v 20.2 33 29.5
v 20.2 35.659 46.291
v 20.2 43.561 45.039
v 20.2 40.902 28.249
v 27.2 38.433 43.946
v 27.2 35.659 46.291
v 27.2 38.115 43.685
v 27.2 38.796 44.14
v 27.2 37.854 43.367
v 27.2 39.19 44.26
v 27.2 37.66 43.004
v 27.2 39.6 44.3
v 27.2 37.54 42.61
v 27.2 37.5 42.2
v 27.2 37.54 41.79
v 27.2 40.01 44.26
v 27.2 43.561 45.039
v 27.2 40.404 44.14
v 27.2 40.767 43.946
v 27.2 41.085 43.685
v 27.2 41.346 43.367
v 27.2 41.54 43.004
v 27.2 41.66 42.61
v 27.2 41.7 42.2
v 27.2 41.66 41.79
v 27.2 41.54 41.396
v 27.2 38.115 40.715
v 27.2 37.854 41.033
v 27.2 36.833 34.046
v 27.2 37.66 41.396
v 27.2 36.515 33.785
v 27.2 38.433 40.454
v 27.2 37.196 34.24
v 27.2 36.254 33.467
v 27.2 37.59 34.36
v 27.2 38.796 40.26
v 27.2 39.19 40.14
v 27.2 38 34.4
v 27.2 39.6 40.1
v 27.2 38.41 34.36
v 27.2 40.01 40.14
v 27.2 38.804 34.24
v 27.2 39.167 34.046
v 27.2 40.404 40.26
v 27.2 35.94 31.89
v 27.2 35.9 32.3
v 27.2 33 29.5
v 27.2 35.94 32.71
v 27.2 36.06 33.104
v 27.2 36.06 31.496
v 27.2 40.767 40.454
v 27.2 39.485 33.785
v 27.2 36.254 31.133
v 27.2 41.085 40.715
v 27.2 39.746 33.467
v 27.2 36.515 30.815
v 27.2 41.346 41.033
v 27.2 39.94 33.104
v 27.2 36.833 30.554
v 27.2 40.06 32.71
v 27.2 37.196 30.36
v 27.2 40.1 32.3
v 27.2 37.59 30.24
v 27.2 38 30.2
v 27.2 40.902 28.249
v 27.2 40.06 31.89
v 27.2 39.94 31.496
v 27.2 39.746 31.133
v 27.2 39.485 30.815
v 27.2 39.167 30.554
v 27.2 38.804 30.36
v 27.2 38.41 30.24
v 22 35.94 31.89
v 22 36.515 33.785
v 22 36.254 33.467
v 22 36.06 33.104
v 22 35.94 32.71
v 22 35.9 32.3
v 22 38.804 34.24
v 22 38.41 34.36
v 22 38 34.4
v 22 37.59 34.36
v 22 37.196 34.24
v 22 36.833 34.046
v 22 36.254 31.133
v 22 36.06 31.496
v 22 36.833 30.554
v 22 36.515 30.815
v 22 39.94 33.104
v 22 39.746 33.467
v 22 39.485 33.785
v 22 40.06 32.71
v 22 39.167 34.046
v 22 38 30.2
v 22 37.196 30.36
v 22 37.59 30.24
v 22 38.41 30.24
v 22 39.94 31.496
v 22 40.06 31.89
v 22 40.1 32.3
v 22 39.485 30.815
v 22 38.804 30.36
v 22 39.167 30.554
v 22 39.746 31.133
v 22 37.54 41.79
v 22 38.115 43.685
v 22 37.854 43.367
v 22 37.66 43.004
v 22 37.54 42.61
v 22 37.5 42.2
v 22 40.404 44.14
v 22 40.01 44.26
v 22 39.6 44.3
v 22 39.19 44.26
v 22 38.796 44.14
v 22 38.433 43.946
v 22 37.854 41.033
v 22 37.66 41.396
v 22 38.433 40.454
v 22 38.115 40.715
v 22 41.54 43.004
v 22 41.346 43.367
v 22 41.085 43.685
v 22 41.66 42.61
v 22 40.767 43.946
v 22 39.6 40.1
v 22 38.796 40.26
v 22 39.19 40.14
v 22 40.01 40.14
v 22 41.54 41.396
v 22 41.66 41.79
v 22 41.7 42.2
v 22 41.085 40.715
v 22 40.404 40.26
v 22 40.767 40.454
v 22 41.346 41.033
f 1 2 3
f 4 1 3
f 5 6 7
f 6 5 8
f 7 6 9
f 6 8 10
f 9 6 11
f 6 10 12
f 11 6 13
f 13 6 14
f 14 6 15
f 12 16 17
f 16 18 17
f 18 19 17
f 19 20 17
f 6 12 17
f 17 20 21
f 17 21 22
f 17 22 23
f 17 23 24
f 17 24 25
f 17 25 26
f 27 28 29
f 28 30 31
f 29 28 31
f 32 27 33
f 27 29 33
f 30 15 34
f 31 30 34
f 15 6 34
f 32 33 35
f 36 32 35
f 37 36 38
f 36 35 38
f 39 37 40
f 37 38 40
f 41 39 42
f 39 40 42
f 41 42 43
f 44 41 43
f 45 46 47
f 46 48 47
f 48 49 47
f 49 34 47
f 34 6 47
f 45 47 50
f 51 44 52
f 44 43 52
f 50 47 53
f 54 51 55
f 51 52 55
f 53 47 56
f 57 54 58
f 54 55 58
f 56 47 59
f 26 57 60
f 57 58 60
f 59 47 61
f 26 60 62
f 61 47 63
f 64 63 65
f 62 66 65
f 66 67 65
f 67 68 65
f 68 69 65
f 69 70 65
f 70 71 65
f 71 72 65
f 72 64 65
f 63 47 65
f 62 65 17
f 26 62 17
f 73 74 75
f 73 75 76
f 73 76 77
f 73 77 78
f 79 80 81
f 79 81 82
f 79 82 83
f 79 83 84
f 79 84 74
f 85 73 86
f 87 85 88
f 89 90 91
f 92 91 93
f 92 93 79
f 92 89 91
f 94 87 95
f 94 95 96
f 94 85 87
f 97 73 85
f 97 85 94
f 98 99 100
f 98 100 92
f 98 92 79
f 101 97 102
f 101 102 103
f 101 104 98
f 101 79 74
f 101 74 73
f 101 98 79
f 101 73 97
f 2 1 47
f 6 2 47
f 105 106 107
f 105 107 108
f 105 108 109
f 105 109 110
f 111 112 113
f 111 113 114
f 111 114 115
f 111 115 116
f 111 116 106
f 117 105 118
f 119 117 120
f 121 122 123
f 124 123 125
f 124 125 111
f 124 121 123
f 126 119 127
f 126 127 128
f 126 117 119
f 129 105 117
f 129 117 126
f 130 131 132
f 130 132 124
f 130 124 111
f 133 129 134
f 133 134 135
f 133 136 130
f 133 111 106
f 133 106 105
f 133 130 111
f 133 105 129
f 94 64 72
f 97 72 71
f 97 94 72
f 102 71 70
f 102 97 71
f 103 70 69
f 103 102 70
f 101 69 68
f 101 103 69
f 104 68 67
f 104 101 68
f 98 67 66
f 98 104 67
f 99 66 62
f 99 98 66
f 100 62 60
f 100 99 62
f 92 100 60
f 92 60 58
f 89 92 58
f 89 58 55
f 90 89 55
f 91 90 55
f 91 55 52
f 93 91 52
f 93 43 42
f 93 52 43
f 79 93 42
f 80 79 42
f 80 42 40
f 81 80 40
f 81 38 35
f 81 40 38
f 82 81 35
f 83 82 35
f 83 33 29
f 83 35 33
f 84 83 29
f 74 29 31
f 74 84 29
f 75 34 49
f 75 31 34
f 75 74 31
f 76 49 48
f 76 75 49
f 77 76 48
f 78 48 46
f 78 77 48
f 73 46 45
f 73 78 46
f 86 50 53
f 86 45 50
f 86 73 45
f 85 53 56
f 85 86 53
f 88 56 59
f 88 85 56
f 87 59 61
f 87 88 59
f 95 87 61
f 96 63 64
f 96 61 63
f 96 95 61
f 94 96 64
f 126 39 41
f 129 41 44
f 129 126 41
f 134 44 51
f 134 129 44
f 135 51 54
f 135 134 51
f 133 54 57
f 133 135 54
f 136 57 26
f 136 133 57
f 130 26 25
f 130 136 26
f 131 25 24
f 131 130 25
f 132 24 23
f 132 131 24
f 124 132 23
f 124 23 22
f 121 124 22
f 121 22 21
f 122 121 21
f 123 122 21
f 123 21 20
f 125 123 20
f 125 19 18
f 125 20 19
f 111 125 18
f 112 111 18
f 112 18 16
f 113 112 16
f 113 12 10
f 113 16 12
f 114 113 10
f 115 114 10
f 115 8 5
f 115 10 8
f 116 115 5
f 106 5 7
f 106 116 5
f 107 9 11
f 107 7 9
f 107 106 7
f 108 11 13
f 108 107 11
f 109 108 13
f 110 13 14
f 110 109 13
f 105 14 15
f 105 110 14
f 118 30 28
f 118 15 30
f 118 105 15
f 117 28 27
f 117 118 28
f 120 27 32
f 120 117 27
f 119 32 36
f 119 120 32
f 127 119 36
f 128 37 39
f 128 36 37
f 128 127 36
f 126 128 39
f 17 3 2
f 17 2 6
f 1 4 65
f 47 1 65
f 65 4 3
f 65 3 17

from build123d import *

# Parameters (mm, degrees)
CYLINDER002_R       = 2.1
CYLINDER002_DEPTH   = 10
CYLINDER001_R       = 2.1
CYLINDER001_DEPTH   = 10
BOX_W               = 7
BOX_H               = 8
BOX_DEPTH           = 17
BOX_PLACEMENT_ANGLE = 9


with BuildPart() as cylinder002:
    # Cylinder002 → Cylinder002 (new body)
    with BuildSketch(Plane(origin=(23, 39.6, 42.2), x_dir=(0, 0, -1), z_dir=(1, 0, 0))):
        Circle(CYLINDER002_R)
    extrude(amount=CYLINDER002_DEPTH)


with BuildPart() as fusion:
    # Cylinder001 → Cylinder001 (new body)
    with BuildSketch(Plane(origin=(23, 38, 32.3), x_dir=(0, 0, -1), z_dir=(1, 0, 0))):
        Circle(CYLINDER001_R)
    extrude(amount=CYLINDER001_DEPTH)

    # Fusion: union Cylinder002
    add(cylinder002.part)


with BuildPart() as fusion_1:
    # Fusion placement: moved
    add(fusion.part.moved(Location((-1, 0, 0))))


with BuildPart() as cut001:
    # Box → Box (new body)
    with BuildSketch(Plane.XY):
        with Locations((3.5, 4)):
            Rectangle(BOX_W, BOX_H)
    extrude(amount=BOX_DEPTH)


with BuildPart() as cut001_1:
    # Box placement: moved
    add(cut001.part.moved(Location((20.2, 33, 29.5))).rotate(Axis((20.2, 33, 29.5), (-1, 0, 0)), BOX_PLACEMENT_ANGLE))

    # Cut001: cut Fusion
    add(fusion_1.part, mode=Mode.SUBTRACT)


solid = cut001_1.part
